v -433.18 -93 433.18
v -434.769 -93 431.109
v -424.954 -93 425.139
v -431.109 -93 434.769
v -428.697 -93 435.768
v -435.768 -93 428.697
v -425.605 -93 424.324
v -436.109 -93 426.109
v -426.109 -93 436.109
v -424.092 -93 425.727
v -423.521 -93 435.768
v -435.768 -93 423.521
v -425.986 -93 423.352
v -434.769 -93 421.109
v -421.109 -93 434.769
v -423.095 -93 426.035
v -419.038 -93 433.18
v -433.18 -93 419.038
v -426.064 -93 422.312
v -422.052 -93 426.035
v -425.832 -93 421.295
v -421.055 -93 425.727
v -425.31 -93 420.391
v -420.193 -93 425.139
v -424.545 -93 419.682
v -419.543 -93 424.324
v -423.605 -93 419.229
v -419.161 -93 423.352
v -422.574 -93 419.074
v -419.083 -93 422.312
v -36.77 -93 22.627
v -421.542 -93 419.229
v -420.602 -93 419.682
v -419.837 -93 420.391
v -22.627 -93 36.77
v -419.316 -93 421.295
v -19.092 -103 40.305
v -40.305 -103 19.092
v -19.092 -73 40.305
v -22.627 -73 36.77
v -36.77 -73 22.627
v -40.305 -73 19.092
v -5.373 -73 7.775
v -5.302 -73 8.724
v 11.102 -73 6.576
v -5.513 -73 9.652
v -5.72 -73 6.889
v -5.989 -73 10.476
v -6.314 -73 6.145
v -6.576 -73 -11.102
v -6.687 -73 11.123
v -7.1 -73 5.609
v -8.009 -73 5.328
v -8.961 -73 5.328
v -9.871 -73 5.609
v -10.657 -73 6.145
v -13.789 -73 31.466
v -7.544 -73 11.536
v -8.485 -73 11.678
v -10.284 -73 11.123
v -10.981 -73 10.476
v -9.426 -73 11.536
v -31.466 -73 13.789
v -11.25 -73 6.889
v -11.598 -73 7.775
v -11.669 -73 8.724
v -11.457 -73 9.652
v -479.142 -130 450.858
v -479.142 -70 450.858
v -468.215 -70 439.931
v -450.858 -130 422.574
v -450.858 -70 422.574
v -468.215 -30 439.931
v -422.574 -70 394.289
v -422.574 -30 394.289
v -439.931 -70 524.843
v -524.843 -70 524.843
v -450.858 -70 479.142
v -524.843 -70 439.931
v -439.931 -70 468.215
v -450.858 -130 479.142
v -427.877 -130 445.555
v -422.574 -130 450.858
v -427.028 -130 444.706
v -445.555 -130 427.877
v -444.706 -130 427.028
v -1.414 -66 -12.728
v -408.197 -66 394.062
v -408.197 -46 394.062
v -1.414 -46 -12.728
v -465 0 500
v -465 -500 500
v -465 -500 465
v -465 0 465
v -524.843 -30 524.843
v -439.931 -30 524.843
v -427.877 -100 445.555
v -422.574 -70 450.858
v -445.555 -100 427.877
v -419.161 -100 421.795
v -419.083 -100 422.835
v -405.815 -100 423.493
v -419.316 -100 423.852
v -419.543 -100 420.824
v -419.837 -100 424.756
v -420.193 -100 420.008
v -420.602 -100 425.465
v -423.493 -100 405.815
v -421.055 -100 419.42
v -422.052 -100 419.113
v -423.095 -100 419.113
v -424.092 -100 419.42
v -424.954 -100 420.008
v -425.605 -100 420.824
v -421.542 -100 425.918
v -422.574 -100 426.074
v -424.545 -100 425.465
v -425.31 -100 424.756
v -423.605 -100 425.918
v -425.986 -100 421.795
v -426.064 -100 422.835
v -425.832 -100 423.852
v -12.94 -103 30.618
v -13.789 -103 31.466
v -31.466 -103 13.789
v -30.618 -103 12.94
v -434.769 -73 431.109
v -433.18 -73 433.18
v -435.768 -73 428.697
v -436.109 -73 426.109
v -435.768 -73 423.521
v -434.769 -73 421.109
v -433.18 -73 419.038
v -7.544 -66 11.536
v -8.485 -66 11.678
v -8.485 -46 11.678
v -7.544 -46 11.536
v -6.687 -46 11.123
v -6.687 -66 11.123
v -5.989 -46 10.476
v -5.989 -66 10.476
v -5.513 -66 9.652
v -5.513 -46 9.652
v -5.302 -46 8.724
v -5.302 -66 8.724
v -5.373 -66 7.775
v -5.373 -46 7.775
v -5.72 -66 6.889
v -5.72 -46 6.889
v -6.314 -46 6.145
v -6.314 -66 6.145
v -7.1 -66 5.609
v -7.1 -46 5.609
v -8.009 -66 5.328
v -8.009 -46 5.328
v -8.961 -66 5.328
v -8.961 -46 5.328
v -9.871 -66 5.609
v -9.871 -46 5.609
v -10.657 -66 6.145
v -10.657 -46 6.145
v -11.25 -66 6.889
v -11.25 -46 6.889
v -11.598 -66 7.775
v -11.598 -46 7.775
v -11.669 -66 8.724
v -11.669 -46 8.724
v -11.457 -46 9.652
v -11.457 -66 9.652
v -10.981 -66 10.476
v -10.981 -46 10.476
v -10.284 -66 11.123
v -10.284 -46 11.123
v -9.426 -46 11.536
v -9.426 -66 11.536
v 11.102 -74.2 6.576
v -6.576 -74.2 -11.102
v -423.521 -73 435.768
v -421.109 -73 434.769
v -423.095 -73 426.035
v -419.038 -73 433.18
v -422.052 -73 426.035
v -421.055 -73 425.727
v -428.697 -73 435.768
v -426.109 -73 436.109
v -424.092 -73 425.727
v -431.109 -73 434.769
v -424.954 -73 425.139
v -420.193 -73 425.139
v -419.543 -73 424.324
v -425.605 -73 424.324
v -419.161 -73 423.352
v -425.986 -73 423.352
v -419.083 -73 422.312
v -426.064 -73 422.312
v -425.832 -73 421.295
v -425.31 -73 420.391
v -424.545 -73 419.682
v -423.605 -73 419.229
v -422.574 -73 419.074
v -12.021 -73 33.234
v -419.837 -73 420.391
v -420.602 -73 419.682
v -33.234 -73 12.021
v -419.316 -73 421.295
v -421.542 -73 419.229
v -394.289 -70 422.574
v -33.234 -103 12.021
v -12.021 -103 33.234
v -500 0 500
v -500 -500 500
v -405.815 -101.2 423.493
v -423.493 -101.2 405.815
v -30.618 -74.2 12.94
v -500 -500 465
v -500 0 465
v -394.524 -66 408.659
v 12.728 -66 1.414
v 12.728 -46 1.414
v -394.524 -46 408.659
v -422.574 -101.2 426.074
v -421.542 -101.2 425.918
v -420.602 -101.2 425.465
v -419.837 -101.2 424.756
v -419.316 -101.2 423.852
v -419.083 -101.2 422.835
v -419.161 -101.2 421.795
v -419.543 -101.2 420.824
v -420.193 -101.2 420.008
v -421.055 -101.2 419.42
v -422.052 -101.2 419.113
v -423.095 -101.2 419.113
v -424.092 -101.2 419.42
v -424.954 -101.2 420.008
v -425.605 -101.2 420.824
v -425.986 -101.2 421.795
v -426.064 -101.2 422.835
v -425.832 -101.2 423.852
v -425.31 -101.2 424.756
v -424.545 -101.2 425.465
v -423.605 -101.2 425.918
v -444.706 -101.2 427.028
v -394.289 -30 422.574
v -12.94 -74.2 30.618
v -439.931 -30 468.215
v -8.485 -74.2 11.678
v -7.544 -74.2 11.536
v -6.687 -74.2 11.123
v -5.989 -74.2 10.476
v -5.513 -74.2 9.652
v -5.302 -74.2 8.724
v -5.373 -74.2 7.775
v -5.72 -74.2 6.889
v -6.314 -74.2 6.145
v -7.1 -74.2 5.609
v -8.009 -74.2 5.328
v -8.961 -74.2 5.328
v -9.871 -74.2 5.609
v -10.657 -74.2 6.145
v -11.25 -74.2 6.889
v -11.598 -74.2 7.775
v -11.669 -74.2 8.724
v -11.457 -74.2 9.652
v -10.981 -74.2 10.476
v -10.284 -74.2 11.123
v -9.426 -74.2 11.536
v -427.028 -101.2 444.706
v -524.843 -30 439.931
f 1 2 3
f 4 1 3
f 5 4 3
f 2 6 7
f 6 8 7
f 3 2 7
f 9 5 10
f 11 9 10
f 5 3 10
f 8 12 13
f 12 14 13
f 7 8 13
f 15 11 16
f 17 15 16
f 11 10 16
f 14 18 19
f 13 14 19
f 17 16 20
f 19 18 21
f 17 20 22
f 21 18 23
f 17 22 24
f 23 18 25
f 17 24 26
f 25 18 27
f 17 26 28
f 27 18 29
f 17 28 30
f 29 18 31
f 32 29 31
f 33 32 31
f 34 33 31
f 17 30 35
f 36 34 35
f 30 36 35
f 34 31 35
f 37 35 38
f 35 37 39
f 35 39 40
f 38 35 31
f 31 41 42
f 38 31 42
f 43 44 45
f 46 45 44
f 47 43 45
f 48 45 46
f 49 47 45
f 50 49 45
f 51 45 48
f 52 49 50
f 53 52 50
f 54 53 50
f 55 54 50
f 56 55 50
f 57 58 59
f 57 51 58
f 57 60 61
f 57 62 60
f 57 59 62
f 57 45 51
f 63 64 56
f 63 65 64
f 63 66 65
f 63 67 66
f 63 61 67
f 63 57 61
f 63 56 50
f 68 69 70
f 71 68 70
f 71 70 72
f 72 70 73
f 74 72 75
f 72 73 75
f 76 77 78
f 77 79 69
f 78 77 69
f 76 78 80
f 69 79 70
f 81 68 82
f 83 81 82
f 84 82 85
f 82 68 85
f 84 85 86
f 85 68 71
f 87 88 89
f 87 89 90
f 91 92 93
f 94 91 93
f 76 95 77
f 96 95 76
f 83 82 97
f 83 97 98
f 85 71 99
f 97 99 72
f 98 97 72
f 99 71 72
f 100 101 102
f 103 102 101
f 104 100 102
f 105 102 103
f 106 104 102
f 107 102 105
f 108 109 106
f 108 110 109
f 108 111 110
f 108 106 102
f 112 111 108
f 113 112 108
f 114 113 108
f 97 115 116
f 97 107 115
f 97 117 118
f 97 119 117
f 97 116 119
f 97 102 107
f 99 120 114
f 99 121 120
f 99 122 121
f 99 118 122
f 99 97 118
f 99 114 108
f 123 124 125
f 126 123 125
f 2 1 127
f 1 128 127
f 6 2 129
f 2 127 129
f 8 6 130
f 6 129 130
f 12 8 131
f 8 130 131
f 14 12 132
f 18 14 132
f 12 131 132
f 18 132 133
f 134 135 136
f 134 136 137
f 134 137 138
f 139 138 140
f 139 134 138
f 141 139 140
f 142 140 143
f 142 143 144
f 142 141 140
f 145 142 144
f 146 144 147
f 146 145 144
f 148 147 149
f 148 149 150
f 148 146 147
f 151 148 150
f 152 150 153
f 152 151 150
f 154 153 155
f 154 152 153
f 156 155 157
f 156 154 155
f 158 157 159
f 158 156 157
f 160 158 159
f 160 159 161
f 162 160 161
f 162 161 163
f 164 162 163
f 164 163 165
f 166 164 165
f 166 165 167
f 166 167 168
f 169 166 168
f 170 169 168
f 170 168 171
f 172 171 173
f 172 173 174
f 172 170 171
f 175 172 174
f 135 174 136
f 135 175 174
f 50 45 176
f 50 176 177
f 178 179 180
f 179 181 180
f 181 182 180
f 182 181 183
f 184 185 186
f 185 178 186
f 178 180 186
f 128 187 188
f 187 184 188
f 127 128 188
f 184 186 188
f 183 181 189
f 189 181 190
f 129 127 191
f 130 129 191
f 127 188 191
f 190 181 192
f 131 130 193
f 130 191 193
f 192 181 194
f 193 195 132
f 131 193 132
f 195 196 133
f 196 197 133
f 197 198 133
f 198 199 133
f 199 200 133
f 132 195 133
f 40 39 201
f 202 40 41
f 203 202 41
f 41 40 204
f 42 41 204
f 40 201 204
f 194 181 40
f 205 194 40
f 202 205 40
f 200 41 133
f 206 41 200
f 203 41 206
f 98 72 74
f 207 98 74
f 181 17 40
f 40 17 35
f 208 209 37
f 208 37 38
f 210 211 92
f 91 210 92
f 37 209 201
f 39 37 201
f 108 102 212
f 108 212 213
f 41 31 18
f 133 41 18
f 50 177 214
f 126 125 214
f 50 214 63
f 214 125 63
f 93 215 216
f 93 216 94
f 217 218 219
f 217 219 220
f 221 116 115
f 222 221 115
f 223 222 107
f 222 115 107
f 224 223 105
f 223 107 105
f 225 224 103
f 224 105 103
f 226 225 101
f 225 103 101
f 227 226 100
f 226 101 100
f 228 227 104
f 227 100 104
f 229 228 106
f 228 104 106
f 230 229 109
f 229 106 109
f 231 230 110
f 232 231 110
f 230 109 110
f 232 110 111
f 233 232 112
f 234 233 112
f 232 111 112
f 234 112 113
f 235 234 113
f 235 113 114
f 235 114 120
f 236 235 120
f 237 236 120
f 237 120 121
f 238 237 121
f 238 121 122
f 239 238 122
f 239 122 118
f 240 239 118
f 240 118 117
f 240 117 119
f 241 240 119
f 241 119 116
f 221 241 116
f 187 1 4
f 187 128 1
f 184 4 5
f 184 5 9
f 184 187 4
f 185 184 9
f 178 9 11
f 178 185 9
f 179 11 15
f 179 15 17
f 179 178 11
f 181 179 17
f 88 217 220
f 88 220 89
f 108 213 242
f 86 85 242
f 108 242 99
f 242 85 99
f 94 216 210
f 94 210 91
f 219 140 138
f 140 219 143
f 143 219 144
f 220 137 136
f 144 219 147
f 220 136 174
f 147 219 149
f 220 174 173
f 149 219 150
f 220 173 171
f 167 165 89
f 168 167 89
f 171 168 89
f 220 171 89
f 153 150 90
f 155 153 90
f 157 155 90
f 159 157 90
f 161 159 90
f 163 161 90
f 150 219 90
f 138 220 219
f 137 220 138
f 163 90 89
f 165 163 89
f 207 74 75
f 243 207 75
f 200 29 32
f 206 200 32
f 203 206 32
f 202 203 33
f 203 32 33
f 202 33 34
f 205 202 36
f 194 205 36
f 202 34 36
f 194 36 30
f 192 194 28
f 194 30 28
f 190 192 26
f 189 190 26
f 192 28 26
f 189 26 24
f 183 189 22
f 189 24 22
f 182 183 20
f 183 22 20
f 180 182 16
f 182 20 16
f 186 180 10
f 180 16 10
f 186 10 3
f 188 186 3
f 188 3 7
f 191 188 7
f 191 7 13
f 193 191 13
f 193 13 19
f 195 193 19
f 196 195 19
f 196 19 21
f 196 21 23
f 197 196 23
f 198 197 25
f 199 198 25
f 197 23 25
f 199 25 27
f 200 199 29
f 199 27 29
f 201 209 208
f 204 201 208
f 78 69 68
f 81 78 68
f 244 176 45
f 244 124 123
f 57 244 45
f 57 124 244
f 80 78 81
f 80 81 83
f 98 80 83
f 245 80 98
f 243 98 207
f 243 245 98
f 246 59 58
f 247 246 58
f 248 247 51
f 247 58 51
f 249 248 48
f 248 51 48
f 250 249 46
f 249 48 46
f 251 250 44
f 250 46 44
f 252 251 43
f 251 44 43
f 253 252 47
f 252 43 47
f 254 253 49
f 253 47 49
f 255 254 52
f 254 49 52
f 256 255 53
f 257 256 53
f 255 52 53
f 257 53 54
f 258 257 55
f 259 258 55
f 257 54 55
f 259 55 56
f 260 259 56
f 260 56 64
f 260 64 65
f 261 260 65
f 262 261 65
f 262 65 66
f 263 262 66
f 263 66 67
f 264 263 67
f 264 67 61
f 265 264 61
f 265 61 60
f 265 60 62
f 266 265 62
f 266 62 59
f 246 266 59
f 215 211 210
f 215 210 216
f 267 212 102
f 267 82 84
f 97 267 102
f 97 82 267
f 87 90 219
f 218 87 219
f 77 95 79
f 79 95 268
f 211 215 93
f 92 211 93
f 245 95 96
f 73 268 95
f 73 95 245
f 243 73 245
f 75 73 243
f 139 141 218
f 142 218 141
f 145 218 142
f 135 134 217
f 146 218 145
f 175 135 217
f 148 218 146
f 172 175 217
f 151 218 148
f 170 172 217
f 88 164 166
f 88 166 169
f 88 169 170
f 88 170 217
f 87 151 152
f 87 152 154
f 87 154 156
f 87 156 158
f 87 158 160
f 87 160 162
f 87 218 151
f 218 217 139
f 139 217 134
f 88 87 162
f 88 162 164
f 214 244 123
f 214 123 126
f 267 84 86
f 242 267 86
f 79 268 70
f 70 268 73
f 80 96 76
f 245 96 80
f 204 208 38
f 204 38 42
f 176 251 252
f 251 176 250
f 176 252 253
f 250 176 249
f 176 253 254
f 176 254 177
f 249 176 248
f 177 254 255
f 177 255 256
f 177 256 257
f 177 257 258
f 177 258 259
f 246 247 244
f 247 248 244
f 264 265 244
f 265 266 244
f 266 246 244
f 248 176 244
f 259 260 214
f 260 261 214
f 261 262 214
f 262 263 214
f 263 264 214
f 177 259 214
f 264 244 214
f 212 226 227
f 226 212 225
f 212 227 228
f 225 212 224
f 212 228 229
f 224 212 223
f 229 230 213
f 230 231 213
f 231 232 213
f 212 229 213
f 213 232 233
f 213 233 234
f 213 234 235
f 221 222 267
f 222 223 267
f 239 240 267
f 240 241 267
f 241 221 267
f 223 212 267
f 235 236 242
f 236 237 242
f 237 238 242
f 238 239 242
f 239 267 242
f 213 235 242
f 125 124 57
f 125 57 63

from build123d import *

# Parameters (mm, degrees)
SKETCH2_W                = 35
SKETCH2_H                = 35
BOSS_EXTRUDE1_DEPTH      = 500
BOSS_EXTRUDE2_DEPTH      = 20
BOSS_EXTRUDE2_DEPTH_BACK = 20
SKETCH6_W                = 84.911353559
SKETCH6_H                = 84.911353559
BOSS_EXTRUDE9_DEPTH      = 40
SKETCH7_W                = 25
SKETCH7_H                = 30
BOSS_EXTRUDE10_DEPTH     = 1.2
SKETCH9_W                = 25
SKETCH9_H                = 1.2
BOSS_EXTRUDE11_DEPTH     = 30
SKETCH10_R               = 3.5
CUT_EXTRUDE1_DEPTH       = 30
BOSS_EXTRUDE12_DEPTH     = 20
FILLET1_R                = 10
CUT_EXTRUDE2_DEPTH       = 20
CUT_EXTRUDE2_DEPTH_BACK  = 30
SKETCH15_W               = 30
SKETCH15_H               = 30
BOSS_EXTRUDE14_DEPTH     = 10
SKETCH16_W               = 25
SKETCH16_H               = 30
BOSS_EXTRUDE15_DEPTH     = 1.2
SKETCH17_W               = 25
SKETCH17_H               = 1.2
BOSS_EXTRUDE16_DEPTH     = 34
SKETCH18_R               = 3.192669461
CUT_EXTRUDE3_DEPTH       = 4
SKETCH19_R               = 3.192669461
BOSS_EXTRUDE18_DEPTH     = 20
SKETCH20_R               = 3.5
CUT_EXTRUDE4_DEPTH       = 20


with BuildPart() as part:
    # Sketch2 → Boss-Extrude1 (new body)
    with BuildSketch(Plane(origin=(0, 0, 0), x_dir=(1, 0, 0), z_dir=(0, 1, 0))):
        with Locations((-482.5, -482.5)):
            Rectangle(SKETCH2_W, SKETCH2_H)
    extrude(amount=-BOSS_EXTRUDE1_DEPTH)


with BuildPart() as body_2:
    # Sketch5 → Boss-Extrude2 (new, two sides: drawn at the far end of the back side and taken through both)
    with BuildSketch(Plane(origin=(0, 0, 0), x_dir=(0.7071067811865475, 0, -0.7071067811865477), z_dir=(0.7071067811865477, 0, 0.7071067811865475)).offset(-BOSS_EXTRUDE2_DEPTH_BACK)):
        Polygon((-657.609306503, -130), (-617.609306503, -130), (-617.609306503, -70), (-577.609306503, -70), (-577.609306503, -30), (-657.609306503, -30), align=None)
    extrude(amount=BOSS_EXTRUDE2_DEPTH + BOSS_EXTRUDE2_DEPTH_BACK)


with BuildPart() as body_3:
    # Sketch6 → Boss-Extrude9 (new body)
    with BuildSketch(Plane(origin=(0, -30, 0), x_dir=(1, 0, 0), z_dir=(0, 1, 0))):
        with Locations((-482.386838229, -482.386838229)):
            Rectangle(SKETCH6_W, SKETCH6_H)
    extrude(amount=-BOSS_EXTRUDE9_DEPTH)


with BuildPart() as body_2_1:
    add(body_2.part)

    # Combine2: union body 3
    add(body_3.part)

    # Sketch7 → Boss-Extrude10 (add)
    with BuildSketch(Plane(origin=(-436.715728753, 0, 436.715728753), x_dir=(-0.7071067811865476, 0, -0.7071067811865476), z_dir=(0.7071067811865476, 0, -0.7071067811865476))):
        with Locations((0, -115)):
            Rectangle(SKETCH7_W, SKETCH7_H)
    extrude(amount=BOSS_EXTRUDE10_DEPTH)

    # Sketch9 → Boss-Extrude11 (add)
    with BuildSketch(Plane(origin=(-435.867200615, 0, 435.867200615), x_dir=(-0.7071067811865475, 0, -0.7071067811865477), z_dir=(0.7071067811865477, 0, -0.7071067811865475))):
        with Locations((0, -100.6)):
            Rectangle(SKETCH9_W, SKETCH9_H)
    extrude(amount=BOSS_EXTRUDE11_DEPTH)

    # Sketch10 → Cut-Extrude1 (cut)
    with BuildSketch(Plane(origin=(0, -100, 0), x_dir=(1, 0, 0), z_dir=(0, 1, 0))):
        with Locations(Location((-422.573593129, -422.573593129, 0), (0, 0, 270))):
            Circle(SKETCH10_R)
    extrude(amount=-CUT_EXTRUDE1_DEPTH, mode=Mode.SUBTRACT)


with BuildPart() as body_3_2:
    # Sketch13 → Boss-Extrude12 (new body)
    with BuildSketch(Plane(origin=(0, -93, 0), x_dir=(1, 0, 0), z_dir=(0, 1, 0))):
        Polygon((-440.251262658, -426.109127035), (-426.109127035, -440.251262658), (7.071067812, -7.071067812), (-7.071067812, 7.071067812), align=None)
    extrude(amount=BOSS_EXTRUDE12_DEPTH)

    # Fillet1
    fillet1_edges = [body_3_2.edges().sort_by_distance(p)[0] for p in [
        (-440.251262658, -83, 426.109127035),
        (-426.109127035, -83, 440.251262658),
    ]]
    fillet(fillet1_edges, radius=FILLET1_R - 0.0001)  # a hair under: the kernel refuses the full size

    # Sketch14 → Cut-Extrude2 (cut, two sides: drawn at the far end of the back side and taken through both)
    with BuildSketch(Plane(origin=(0, -73, 0), x_dir=(1, 0, 0), z_dir=(0, 1, 0)).offset(-CUT_EXTRUDE2_DEPTH_BACK)):
        Polygon((-38.774344763, -6.480489233), (-6.480489233, -38.774344763), (24.367106229, -7.926749301), (-7.926749301, 24.367106229), align=None)
    extrude(amount=CUT_EXTRUDE2_DEPTH + CUT_EXTRUDE2_DEPTH_BACK, mode=Mode.SUBTRACT)

    # Sketch15 → Boss-Extrude14 (add)
    with BuildSketch(Plane(origin=(-22.627416998, 0, 22.627416998), x_dir=(-0.7071067811865561, 0, -0.7071067811865389), z_dir=(0.7071067811865389, 0, -0.7071067811865561))):
        with Locations((0, -88)):
            Rectangle(SKETCH15_W, SKETCH15_H)
    extrude(amount=-BOSS_EXTRUDE14_DEPTH)

    # Sketch20 → Cut-Extrude4 (cut)
    with BuildSketch(Plane.XZ.offset(93)):
        with Locations(Location((-422.573593129, 422.573593129, 0), (0, 0, 270))):
            Circle(SKETCH20_R)
    extrude(amount=-CUT_EXTRUDE4_DEPTH, mode=Mode.SUBTRACT)


with BuildPart() as body_4:
    # Sketch16 → Boss-Extrude15 (new body)
    with BuildSketch(Plane(origin=(-22.627416998, 0, 22.627416998), x_dir=(-0.7071067811865561, 0, -0.7071067811865389), z_dir=(0.7071067811865389, 0, -0.7071067811865561))):
        with Locations((0, -88)):
            Rectangle(SKETCH16_W, SKETCH16_H)
    extrude(amount=BOSS_EXTRUDE15_DEPTH)

    # Sketch17 → Boss-Extrude16 (add)
    with BuildSketch(Plane(origin=(-21.778888861, 0, 21.778888861), x_dir=(-0.7071067811865561, 0, -0.7071067811865389), z_dir=(0.7071067811865389, 0, -0.7071067811865561))):
        with Locations((0, -73.6)):
            Rectangle(SKETCH17_W, SKETCH17_H)
    extrude(amount=BOSS_EXTRUDE16_DEPTH)

    # Sketch18 → Cut-Extrude3 (cut)
    with BuildSketch(Plane(origin=(0, -73, 0), x_dir=(1, 0, 0), z_dir=(0, 1, 0))):
        with Locations(Location((-8.485281374, -8.485281374, 0), (0, 0, 270))):
            Circle(SKETCH18_R)
    extrude(amount=-CUT_EXTRUDE3_DEPTH, mode=Mode.SUBTRACT)


with BuildPart() as body_5:
    # Sketch19 → Boss-Extrude18 (new body)
    with BuildSketch(Plane(origin=(0, -66, 0), x_dir=(1, 0, 0), z_dir=(0, 1, 0))):
        Polygon((-1.414213562, 12.727922061), (12.727922061, -1.414213562), (-394.524128884, -408.658714032), (-408.196650502, -394.062065355), align=None)
        with Locations(Location((-8.485281374, -8.485281374, 0), (0, 0, 270))):
            Circle(SKETCH19_R, mode=Mode.SUBTRACT)
    extrude(amount=BOSS_EXTRUDE18_DEPTH)


solid = Compound([part.part, body_2_1.part, body_3_2.part, body_4.part, body_5.part])
